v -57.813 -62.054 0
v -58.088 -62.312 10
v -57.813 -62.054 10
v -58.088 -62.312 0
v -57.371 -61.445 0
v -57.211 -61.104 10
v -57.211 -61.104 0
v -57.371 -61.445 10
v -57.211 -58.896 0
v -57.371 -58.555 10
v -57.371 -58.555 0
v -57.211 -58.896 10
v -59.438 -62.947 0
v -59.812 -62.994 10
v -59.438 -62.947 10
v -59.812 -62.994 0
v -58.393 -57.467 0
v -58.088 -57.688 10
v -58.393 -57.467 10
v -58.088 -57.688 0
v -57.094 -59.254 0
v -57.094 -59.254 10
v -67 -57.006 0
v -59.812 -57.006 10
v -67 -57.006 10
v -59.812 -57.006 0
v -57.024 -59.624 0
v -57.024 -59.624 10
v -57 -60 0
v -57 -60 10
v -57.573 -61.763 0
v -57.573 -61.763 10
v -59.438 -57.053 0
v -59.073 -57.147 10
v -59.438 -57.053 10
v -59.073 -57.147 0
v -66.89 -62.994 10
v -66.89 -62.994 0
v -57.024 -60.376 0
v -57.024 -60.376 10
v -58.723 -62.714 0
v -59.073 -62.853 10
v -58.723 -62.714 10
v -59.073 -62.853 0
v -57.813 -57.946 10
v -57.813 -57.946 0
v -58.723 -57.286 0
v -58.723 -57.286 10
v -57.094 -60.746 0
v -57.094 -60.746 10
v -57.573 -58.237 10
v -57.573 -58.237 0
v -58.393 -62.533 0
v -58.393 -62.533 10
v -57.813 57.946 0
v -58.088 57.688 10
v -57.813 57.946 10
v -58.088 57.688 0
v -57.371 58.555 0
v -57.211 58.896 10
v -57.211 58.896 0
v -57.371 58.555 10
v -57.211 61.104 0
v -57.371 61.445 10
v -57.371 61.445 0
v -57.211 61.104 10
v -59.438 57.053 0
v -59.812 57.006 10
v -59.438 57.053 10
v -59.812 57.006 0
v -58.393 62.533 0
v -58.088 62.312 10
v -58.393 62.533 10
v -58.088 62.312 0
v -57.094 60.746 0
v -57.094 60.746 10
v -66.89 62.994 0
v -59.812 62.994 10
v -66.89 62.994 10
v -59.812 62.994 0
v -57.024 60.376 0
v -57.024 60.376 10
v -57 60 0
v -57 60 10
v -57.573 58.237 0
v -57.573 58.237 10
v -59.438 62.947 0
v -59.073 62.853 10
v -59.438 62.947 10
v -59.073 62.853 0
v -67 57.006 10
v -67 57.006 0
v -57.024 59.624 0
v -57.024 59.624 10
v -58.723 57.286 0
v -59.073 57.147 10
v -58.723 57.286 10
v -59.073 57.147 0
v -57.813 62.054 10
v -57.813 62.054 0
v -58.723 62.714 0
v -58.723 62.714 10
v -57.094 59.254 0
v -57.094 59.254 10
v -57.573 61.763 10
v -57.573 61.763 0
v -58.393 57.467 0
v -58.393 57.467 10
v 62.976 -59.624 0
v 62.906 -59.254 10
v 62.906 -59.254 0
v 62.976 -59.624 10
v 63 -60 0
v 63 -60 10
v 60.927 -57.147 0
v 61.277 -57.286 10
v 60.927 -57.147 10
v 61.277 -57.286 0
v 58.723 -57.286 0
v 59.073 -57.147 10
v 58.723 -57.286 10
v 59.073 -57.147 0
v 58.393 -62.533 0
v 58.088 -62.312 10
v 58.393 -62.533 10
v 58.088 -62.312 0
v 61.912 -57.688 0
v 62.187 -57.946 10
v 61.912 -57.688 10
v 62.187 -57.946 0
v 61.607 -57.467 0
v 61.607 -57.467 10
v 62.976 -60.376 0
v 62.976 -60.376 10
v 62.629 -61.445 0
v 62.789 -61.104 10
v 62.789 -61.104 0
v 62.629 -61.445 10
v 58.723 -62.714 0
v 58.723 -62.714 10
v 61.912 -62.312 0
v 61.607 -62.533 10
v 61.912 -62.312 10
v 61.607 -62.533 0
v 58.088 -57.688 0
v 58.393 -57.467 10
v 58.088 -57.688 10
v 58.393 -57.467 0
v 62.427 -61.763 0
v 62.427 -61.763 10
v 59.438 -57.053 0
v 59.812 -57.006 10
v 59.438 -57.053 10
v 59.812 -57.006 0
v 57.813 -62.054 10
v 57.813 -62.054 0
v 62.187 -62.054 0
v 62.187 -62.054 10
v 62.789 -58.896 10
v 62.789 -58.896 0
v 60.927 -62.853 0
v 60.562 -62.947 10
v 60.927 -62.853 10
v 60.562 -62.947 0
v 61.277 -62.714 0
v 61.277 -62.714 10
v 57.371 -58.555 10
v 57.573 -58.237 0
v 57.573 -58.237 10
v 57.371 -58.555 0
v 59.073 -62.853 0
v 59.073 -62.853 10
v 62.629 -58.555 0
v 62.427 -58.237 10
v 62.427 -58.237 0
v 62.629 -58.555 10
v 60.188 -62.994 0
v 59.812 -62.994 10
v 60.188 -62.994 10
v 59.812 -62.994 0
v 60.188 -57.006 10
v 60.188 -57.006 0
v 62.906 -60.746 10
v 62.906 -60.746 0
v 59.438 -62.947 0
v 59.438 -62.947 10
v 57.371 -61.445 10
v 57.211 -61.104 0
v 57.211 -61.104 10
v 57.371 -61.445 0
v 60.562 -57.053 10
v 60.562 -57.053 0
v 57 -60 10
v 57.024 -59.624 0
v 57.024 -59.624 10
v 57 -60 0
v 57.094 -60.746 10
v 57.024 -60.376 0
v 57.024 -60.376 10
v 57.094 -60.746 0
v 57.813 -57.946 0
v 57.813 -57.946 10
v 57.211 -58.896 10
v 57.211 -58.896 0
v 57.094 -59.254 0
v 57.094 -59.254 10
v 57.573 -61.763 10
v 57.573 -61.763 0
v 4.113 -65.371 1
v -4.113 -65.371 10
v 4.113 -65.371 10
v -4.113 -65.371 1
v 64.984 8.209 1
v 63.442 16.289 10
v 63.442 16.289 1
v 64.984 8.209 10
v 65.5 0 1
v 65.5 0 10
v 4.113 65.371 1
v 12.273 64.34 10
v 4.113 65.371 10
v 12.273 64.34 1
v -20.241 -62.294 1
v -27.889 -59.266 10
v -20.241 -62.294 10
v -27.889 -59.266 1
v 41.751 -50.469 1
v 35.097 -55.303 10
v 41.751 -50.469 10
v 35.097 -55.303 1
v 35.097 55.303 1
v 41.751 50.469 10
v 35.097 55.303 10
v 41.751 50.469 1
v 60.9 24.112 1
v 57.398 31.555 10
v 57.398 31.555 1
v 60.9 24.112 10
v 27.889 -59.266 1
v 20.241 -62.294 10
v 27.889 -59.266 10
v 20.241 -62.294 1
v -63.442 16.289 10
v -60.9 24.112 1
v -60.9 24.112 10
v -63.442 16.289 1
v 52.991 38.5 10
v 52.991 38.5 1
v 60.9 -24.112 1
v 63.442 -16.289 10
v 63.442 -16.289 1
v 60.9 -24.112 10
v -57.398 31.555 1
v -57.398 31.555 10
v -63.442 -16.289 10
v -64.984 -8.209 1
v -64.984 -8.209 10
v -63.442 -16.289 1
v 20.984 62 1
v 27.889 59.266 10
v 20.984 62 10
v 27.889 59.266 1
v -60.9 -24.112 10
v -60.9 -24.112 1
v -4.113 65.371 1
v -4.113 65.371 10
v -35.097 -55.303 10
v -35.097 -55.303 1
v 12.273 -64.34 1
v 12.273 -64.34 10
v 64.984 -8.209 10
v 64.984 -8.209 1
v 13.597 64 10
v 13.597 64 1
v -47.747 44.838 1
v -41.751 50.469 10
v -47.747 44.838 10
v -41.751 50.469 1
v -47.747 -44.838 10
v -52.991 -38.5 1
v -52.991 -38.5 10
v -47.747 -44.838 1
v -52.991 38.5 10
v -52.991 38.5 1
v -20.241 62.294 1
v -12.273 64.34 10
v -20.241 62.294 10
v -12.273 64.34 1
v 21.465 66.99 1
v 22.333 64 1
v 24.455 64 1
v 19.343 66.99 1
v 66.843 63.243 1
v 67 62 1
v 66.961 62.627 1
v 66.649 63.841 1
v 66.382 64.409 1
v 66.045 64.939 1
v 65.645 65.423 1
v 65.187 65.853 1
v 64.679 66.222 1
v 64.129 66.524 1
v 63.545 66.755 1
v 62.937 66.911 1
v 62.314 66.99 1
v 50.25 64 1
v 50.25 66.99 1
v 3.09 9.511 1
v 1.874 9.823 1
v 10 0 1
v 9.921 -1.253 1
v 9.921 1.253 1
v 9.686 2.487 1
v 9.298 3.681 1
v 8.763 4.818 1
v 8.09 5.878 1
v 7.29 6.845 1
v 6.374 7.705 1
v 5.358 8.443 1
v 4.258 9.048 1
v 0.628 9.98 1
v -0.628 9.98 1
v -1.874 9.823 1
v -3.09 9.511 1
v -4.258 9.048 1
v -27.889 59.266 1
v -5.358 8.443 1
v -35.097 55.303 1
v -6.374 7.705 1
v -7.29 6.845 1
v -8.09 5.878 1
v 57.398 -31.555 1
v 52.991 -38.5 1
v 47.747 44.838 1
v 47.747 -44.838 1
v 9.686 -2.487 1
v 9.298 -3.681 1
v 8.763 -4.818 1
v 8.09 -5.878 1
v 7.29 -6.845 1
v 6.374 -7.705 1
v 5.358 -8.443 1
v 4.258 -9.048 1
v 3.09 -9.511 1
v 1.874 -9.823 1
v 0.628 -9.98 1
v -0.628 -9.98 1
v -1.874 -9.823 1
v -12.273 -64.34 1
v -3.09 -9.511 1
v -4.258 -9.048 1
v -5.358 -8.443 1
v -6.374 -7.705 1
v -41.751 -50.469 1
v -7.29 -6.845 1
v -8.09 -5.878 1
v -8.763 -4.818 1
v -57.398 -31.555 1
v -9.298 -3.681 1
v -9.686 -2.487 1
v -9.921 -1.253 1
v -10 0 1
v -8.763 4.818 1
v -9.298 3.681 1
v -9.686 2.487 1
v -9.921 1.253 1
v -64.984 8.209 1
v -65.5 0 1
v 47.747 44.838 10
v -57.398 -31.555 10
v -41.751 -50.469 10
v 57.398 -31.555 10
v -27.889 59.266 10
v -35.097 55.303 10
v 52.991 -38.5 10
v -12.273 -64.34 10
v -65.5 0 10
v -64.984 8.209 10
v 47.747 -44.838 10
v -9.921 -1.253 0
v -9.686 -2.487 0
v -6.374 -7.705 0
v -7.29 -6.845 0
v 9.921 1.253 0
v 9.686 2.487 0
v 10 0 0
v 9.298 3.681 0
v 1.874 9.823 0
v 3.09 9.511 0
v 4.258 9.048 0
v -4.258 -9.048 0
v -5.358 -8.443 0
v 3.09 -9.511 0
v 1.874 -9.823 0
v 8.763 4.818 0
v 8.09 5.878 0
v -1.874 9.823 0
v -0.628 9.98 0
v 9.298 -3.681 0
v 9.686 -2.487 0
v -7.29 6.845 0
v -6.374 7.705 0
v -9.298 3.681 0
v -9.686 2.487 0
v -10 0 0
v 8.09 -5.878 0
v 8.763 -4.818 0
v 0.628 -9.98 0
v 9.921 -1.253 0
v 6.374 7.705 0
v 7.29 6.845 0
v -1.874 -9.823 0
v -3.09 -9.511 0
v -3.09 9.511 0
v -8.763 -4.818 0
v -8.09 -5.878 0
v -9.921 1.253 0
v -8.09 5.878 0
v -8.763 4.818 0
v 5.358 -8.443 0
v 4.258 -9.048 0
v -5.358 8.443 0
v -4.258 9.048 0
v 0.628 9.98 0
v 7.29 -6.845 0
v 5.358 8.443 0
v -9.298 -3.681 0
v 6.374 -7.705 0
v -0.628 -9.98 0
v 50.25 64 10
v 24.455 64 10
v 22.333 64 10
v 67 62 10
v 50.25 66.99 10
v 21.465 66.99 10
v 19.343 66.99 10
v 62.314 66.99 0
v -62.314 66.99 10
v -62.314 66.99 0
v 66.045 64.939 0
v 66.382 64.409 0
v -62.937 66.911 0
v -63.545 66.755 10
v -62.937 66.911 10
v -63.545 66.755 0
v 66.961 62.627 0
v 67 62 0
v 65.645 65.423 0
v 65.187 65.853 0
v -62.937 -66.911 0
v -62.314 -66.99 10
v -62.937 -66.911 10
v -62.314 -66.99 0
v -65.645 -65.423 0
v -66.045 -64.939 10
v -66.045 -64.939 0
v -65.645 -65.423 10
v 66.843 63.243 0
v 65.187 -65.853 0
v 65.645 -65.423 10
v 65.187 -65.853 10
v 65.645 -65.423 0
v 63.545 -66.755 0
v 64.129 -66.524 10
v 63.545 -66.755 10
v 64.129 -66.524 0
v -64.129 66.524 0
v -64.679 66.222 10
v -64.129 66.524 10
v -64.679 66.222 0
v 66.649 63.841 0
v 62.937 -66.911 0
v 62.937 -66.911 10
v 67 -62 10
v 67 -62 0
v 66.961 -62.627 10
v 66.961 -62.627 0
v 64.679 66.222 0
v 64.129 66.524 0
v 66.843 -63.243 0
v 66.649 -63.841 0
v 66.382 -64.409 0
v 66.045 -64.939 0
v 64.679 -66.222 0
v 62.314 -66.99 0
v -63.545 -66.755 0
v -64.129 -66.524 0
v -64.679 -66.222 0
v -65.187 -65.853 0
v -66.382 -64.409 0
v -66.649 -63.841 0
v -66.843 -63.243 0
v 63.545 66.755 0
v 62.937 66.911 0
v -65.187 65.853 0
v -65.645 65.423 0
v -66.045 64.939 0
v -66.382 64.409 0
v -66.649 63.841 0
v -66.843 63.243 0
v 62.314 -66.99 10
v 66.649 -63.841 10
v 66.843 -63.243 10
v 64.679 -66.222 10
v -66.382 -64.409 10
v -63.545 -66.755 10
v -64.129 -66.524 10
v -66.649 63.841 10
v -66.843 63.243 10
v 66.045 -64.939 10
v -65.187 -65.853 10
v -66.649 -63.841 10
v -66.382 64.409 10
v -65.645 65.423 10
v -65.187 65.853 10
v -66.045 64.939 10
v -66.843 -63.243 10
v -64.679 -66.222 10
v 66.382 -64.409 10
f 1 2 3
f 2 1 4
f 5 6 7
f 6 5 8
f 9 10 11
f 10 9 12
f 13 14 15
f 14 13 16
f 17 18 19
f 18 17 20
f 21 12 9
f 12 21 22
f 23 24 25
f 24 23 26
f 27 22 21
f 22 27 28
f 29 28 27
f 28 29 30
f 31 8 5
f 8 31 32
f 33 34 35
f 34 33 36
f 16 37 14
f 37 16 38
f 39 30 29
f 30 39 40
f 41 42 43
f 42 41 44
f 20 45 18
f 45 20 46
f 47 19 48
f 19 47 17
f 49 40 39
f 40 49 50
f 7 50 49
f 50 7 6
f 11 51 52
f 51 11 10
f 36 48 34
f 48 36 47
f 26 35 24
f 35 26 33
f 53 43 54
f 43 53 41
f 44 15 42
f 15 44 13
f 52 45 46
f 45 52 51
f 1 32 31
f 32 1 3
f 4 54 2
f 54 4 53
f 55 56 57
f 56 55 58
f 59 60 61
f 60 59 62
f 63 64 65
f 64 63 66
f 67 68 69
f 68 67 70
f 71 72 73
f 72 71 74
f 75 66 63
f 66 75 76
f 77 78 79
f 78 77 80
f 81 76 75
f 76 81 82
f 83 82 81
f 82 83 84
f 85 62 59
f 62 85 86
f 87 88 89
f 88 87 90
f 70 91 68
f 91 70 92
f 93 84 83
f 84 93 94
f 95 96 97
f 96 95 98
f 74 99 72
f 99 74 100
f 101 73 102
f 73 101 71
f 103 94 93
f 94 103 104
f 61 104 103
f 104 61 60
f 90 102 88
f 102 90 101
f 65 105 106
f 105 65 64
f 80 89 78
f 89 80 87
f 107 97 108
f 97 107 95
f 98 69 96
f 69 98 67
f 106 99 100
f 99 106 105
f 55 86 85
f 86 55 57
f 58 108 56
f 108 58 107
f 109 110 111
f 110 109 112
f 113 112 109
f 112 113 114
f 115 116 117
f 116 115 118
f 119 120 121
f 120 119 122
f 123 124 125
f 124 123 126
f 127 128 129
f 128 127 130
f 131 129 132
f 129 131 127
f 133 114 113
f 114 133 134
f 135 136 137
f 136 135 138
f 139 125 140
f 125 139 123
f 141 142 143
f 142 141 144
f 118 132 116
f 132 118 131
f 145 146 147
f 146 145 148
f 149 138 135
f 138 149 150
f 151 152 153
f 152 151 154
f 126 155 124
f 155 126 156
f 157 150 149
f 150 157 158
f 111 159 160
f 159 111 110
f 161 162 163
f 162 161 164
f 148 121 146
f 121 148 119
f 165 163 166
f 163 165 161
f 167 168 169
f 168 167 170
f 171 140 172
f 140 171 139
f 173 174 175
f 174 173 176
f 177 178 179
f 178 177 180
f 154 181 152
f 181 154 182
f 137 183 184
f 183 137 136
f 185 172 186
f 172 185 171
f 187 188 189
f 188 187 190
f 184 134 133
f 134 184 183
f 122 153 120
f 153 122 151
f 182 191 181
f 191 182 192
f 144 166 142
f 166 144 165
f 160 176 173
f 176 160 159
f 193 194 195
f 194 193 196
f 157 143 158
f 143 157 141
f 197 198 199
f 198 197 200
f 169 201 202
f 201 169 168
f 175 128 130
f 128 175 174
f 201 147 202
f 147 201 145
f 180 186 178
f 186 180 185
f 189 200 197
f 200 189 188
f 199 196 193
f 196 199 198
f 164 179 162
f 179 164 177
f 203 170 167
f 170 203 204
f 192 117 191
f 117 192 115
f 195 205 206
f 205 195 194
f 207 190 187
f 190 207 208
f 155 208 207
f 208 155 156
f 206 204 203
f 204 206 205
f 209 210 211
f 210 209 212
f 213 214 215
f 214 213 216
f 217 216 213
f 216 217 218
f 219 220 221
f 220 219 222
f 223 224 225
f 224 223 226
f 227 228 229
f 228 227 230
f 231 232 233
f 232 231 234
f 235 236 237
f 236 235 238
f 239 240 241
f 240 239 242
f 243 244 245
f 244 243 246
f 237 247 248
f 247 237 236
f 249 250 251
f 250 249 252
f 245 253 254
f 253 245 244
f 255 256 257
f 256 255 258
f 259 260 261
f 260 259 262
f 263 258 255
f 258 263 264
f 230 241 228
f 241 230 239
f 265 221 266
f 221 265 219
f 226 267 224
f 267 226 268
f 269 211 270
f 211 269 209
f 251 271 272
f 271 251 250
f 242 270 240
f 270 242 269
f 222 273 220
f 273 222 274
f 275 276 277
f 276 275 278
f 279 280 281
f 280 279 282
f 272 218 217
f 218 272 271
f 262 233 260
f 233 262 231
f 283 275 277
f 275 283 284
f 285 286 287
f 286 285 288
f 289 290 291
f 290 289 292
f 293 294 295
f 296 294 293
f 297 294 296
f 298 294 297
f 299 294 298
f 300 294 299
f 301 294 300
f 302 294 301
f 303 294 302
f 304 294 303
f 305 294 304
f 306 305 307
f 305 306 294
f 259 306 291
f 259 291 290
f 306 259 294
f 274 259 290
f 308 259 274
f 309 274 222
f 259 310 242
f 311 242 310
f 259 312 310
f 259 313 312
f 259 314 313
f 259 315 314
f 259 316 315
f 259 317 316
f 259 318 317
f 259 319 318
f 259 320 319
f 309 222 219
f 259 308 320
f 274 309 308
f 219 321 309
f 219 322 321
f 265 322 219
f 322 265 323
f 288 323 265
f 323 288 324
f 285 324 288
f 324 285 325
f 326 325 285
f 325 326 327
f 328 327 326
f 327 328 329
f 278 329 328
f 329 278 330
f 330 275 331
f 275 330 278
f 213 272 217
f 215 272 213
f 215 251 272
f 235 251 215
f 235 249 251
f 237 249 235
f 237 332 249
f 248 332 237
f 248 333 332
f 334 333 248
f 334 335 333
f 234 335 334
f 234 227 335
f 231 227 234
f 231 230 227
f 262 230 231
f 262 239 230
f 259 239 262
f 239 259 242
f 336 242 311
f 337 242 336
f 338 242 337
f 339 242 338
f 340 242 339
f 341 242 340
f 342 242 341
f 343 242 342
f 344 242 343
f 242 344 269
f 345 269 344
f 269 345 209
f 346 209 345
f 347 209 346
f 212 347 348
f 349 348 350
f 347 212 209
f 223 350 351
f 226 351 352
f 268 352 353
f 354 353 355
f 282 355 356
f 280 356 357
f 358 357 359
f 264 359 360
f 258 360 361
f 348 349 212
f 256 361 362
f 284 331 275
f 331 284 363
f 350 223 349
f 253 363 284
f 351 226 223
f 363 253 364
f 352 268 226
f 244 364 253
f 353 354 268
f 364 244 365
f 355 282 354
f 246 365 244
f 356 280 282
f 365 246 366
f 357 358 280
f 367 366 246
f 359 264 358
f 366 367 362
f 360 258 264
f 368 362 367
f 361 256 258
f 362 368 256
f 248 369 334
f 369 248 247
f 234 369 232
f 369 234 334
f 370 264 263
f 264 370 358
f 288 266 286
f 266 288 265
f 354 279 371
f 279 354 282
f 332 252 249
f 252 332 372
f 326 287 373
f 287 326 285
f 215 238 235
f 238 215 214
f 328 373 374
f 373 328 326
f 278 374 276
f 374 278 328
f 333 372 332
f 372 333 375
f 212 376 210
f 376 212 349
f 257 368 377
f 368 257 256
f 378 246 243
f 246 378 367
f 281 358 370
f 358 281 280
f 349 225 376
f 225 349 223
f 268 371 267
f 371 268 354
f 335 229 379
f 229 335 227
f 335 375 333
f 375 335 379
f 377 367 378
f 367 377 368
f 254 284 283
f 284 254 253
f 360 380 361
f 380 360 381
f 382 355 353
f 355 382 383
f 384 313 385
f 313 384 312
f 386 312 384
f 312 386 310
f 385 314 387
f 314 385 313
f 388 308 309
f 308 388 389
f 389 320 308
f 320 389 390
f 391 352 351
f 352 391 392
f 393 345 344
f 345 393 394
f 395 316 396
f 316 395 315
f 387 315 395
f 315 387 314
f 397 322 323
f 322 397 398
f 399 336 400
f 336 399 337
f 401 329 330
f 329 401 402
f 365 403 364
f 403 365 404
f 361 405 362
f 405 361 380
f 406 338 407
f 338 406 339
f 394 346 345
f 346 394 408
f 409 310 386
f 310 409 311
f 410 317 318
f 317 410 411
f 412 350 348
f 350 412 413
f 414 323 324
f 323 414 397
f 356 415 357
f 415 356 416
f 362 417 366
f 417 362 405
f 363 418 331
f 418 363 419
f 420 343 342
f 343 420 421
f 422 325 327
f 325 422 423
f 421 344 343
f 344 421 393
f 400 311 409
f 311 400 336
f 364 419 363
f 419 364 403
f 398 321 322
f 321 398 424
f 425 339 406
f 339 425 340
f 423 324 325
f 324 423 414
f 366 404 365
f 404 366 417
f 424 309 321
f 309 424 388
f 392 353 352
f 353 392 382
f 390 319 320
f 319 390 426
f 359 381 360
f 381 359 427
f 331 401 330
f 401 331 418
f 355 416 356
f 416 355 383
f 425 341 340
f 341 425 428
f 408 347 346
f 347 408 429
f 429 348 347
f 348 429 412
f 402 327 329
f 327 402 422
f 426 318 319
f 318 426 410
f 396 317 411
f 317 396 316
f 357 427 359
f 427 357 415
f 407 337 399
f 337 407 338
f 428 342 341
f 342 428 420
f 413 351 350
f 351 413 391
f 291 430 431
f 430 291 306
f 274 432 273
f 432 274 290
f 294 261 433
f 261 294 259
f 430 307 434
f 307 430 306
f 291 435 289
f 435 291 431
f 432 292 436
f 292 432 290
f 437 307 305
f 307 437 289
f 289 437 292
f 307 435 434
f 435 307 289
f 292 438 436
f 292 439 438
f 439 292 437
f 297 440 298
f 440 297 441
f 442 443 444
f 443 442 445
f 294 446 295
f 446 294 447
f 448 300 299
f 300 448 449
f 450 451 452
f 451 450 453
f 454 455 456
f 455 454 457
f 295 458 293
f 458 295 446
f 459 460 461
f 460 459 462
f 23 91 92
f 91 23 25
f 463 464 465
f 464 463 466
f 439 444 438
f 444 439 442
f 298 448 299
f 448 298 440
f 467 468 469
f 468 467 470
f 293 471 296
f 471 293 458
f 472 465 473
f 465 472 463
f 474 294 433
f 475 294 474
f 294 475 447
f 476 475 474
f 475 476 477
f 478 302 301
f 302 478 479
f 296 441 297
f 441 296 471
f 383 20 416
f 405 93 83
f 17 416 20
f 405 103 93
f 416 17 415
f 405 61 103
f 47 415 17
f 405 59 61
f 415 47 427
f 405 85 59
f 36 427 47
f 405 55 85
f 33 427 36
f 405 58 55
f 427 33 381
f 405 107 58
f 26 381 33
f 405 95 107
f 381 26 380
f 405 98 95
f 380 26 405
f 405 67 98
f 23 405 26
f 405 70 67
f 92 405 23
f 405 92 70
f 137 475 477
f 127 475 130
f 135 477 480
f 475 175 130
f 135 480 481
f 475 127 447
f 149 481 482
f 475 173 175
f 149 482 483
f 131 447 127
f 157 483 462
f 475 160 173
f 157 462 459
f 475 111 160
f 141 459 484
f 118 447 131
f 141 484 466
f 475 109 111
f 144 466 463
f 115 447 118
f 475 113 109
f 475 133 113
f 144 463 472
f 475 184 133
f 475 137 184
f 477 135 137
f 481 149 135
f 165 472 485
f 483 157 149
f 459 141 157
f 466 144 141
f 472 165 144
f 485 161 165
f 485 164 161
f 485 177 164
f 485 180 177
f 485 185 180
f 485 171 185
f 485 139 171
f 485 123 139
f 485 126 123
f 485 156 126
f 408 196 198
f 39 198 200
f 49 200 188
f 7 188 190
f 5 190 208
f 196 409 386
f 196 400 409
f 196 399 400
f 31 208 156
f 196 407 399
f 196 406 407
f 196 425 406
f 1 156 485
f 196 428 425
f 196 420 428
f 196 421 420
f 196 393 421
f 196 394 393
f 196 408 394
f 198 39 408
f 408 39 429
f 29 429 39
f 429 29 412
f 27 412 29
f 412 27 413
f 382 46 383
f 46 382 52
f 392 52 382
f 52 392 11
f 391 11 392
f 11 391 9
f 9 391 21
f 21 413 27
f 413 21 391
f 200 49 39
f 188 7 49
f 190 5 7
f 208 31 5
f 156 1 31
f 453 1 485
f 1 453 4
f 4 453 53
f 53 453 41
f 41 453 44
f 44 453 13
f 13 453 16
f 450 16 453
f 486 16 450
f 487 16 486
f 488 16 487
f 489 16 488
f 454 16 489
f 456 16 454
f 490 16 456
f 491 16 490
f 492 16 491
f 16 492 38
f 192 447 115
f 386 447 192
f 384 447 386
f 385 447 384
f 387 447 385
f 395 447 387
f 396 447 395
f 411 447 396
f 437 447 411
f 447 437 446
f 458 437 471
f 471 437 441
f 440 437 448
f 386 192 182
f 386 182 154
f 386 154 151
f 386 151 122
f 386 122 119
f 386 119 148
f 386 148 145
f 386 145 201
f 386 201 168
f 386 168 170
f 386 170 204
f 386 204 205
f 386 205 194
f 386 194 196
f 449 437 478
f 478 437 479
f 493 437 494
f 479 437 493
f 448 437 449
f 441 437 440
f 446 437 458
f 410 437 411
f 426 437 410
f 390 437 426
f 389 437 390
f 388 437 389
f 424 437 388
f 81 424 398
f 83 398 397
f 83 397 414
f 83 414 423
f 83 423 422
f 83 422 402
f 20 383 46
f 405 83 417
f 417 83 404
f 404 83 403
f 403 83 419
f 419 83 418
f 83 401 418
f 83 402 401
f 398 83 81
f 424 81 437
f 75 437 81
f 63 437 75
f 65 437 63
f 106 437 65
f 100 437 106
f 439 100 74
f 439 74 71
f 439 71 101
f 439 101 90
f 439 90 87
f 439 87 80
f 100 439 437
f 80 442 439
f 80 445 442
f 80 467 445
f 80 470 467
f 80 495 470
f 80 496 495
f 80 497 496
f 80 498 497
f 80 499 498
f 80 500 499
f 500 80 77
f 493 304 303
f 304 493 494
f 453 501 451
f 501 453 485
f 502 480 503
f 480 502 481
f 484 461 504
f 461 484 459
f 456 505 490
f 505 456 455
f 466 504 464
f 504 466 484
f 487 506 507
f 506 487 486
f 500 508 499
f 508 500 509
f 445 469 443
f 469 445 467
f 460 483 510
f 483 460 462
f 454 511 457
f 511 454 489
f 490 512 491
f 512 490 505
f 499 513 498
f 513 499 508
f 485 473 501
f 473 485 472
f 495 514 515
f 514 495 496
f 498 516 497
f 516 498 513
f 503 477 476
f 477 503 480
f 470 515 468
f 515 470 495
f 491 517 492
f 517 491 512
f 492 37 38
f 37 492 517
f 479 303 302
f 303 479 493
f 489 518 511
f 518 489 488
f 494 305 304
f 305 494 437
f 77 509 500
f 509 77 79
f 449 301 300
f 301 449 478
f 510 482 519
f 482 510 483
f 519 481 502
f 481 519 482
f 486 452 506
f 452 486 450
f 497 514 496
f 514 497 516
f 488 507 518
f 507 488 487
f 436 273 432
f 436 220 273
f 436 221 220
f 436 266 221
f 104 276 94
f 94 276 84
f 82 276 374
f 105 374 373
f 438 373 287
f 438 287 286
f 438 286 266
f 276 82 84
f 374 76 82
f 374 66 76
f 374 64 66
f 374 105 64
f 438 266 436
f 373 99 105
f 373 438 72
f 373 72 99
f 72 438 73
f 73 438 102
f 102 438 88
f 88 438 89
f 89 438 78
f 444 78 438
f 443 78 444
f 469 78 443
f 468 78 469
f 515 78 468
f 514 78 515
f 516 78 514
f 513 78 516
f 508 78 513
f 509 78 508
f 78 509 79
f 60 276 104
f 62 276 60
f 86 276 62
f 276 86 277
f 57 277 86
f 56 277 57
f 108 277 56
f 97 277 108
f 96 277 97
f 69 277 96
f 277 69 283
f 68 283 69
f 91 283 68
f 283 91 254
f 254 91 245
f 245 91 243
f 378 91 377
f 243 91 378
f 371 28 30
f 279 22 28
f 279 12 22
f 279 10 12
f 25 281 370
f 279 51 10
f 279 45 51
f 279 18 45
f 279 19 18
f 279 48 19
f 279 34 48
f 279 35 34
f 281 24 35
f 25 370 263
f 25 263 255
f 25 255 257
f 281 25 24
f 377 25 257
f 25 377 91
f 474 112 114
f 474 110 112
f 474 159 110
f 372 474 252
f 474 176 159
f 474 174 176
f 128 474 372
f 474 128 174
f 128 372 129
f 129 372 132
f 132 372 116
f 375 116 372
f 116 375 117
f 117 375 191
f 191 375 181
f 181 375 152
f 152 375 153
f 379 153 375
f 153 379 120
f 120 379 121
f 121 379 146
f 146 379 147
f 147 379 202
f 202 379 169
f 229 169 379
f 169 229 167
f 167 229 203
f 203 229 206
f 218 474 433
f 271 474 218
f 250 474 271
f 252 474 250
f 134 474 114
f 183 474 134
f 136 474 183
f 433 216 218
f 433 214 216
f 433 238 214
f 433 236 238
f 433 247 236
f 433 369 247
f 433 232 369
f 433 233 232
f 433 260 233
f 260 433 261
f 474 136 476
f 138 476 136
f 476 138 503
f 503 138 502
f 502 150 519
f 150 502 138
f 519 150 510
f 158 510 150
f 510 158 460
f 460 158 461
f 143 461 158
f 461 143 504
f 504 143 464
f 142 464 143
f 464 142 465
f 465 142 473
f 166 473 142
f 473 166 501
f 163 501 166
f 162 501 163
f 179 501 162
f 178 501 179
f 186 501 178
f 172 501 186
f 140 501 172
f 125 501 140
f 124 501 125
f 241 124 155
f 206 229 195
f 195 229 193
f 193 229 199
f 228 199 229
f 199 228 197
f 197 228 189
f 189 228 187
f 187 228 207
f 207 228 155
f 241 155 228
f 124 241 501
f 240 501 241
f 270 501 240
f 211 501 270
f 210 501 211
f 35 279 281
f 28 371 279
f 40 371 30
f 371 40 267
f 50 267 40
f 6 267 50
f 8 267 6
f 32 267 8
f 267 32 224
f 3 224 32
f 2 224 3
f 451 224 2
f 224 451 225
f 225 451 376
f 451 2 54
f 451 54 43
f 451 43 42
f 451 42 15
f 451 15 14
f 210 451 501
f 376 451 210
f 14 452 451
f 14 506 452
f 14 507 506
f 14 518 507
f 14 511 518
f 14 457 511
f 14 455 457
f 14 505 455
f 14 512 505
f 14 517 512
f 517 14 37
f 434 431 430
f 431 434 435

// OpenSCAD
$fn = 50;


difference() {
	union() {
		translate(v = [0, 0, 0]) {
			rotate(a = [0, 0, 0]) {
				hull() {
					translate(v = [-62.0000000000, 62.0000000000, 0]) {
						rotate(a = [0, 0, 0]) {
							translate(v = [0, 0, 0]) {
								rotate(a = [0, 0, 0]) {
									cylinder(h = 10, r = 5);
								}
							}
						}
					}
					translate(v = [62.0000000000, 62.0000000000, 0]) {
						rotate(a = [0, 0, 0]) {
							translate(v = [0, 0, 0]) {
								rotate(a = [0, 0, 0]) {
									cylinder(h = 10, r = 5);
								}
							}
						}
					}
					translate(v = [-62.0000000000, -62.0000000000, 0]) {
						rotate(a = [0, 0, 0]) {
							translate(v = [0, 0, 0]) {
								rotate(a = [0, 0, 0]) {
									cylinder(h = 10, r = 5);
								}
							}
						}
					}
					translate(v = [62.0000000000, -62.0000000000, 0]) {
						rotate(a = [0, 0, 0]) {
							translate(v = [0, 0, 0]) {
								rotate(a = [0, 0, 0]) {
									cylinder(h = 10, r = 5);
								}
							}
						}
					}
				}
			}
		}
	}
	union() {
		translate(v = [-67.5000000000, -60.0000000000, -125]) {
			rotate(a = [0, 0, 0]) {
				hull() {
					translate(v = [7.5000000000, 0, 0]) {
						rotate(a = [0, 0, 0]) {
							translate(v = [0, 0, 0]) {
								rotate(a = [0, 0, 0]) {
									cylinder(h = 250, r = 3.0000000000);
								}
							}
						}
					}
					translate(v = [-7.5000000000, 0, 0]) {
						rotate(a = [0, 0, 0]) {
							translate(v = [0, 0, 0]) {
								rotate(a = [0, 0, 0]) {
									cylinder(h = 250, r = 3.0000000000);
								}
							}
						}
					}
				}
			}
		}
		translate(v = [-67.5000000000, 60.0000000000, -125]) {
			rotate(a = [0, 0, 0]) {
				hull() {
					translate(v = [7.5000000000, 0, 0]) {
						rotate(a = [0, 0, 0]) {
							translate(v = [0, 0, 0]) {
								rotate(a = [0, 0, 0]) {
									cylinder(h = 250, r = 3.0000000000);
								}
							}
						}
					}
					translate(v = [-7.5000000000, 0, 0]) {
						rotate(a = [0, 0, 0]) {
							translate(v = [0, 0, 0]) {
								rotate(a = [0, 0, 0]) {
									cylinder(h = 250, r = 3.0000000000);
								}
							}
						}
					}
				}
			}
		}
		translate(v = [60.0000000000, -60.0000000000, -125.0000000000]) {
			rotate(a = [0, 0, 0]) {
				cylinder(h = 250, r = 3.0000000000);
			}
		}
		translate(v = [0, 0, 1.0000000000]) {
			rotate(a = [0, 0, 0]) {
				cylinder(h = 12, r = 65.5000000000);
			}
		}
		translate(v = [0, 0, -5.0000000000]) {
			rotate(a = [0, 0, 0]) {
				cylinder(h = 10, r = 10.0000000000);
			}
		}
		translate(v = [0.0000000000, 62.0000000000, 1]) {
			rotate(a = [0, 0, 0]) {
				cube(size = [67.0000000000, 2, 12]);
			}
		}
		translate(v = [50.2500000000, 62.0000000000, 1]) {
			rotate(a = [0, 0, 0]) {
				cube(size = [16.7500000000, 5, 12]);
			}
		}
		translate(v = [18.5833333333, 67.7500000000, 1]) {
			rotate(a = [0, 0, -45]) {
				cube(size = [7.5000000000, 1.5000000000, 12]);
			}
		}
	}
}
